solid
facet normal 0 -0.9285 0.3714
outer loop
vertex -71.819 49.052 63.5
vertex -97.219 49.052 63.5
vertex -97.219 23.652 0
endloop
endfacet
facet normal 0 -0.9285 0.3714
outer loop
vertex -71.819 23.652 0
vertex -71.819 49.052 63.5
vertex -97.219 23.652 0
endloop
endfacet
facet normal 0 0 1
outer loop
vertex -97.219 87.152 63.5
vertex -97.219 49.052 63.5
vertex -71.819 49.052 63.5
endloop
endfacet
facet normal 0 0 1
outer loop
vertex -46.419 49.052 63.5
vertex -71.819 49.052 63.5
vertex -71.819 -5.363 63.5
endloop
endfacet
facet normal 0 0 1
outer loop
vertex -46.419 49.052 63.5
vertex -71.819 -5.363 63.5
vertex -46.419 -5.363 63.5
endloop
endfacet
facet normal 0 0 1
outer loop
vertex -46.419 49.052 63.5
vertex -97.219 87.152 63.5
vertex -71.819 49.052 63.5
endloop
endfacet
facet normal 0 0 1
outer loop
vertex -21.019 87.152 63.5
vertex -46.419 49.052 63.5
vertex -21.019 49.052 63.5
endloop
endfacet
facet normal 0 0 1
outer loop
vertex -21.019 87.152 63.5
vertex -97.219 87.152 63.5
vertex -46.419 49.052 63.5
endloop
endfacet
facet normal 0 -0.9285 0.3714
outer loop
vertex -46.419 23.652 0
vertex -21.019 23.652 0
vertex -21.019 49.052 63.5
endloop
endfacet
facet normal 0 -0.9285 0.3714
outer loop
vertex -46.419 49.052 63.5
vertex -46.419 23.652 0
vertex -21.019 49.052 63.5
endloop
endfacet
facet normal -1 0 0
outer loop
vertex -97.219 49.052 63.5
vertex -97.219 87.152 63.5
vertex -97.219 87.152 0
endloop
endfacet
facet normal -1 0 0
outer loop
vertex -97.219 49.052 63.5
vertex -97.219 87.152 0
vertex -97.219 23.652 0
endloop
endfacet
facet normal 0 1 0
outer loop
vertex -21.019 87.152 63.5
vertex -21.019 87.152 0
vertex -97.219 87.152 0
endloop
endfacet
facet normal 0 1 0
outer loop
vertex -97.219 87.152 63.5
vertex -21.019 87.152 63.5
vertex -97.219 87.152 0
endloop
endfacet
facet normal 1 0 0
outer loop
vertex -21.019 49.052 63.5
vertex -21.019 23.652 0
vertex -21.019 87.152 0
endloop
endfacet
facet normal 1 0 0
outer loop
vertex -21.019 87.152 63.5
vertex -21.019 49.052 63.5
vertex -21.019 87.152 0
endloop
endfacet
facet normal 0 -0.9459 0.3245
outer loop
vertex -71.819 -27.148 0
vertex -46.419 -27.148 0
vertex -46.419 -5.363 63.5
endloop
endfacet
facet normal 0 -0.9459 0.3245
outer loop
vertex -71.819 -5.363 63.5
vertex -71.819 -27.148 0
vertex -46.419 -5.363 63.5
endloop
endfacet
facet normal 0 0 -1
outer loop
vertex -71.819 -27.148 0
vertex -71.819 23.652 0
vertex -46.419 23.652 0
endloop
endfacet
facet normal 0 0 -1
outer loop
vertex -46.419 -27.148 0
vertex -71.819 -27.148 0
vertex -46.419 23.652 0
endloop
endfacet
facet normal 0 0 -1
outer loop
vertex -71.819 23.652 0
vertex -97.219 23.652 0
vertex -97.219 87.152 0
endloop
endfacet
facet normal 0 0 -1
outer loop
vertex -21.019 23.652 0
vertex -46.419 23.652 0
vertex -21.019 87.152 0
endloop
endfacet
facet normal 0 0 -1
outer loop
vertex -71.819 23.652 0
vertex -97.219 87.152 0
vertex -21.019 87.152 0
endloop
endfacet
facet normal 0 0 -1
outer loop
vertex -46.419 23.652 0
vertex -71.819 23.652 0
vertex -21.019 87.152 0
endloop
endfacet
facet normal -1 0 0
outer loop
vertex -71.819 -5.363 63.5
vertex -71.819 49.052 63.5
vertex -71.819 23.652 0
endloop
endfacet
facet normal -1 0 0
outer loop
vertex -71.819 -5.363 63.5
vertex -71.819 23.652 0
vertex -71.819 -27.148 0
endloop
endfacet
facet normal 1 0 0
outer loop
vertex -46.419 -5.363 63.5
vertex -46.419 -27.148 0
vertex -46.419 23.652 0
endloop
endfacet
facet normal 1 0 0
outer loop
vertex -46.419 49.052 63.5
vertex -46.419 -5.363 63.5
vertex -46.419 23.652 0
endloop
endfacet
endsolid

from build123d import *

# Parameters (mm, degrees)
F1_DEPTH = 63.5
F3_DEPTH = 25.4
F5_DEPTH = 25.4
F7_DEPTH = 50.801


with BuildPart() as f1:
    # F0 (on Top) → F1 (new body)
    with BuildSketch(Plane.XY):
        Polygon((-21.019149, 87.15245), (-97.219149, 87.15245), (-97.219149, 23.65245), (-71.819149, 23.65245), (-71.819149, -27.14755), (-46.419149, -27.14755), (-46.419149, 23.65245), (-21.019149, 23.65245), align=None)
    extrude(amount=F1_DEPTH)

    # F2 (on face) → F3 (cut)
    with BuildSketch(Plane(origin=(-97.219149, 0, 0), x_dir=(0, -1, 0), z_dir=(-1, 0, 0))):
        Polygon((-23.65245, 63.5), (-49.05245, 63.5), (-23.65245, 0), align=None)
    extrude(amount=-F3_DEPTH, mode=Mode.SUBTRACT)

    # F4 (on face) → F5 (cut)
    with BuildSketch(Plane.YZ.offset(-21.019149)):
        Polygon((23.65245, 0), (49.05245, 63.5), (23.65245, 63.5), align=None)
    extrude(amount=-F5_DEPTH, mode=Mode.SUBTRACT)

    # F6 (on face) → F7 (cut, through all)
    with BuildSketch(Plane.YZ.offset(-46.419149)):
        Polygon((-27.14755, 0), (-5.36292, 63.5), (-27.14755, 63.5), align=None)
    extrude(amount=-F7_DEPTH, mode=Mode.SUBTRACT)


solid = f1.part
